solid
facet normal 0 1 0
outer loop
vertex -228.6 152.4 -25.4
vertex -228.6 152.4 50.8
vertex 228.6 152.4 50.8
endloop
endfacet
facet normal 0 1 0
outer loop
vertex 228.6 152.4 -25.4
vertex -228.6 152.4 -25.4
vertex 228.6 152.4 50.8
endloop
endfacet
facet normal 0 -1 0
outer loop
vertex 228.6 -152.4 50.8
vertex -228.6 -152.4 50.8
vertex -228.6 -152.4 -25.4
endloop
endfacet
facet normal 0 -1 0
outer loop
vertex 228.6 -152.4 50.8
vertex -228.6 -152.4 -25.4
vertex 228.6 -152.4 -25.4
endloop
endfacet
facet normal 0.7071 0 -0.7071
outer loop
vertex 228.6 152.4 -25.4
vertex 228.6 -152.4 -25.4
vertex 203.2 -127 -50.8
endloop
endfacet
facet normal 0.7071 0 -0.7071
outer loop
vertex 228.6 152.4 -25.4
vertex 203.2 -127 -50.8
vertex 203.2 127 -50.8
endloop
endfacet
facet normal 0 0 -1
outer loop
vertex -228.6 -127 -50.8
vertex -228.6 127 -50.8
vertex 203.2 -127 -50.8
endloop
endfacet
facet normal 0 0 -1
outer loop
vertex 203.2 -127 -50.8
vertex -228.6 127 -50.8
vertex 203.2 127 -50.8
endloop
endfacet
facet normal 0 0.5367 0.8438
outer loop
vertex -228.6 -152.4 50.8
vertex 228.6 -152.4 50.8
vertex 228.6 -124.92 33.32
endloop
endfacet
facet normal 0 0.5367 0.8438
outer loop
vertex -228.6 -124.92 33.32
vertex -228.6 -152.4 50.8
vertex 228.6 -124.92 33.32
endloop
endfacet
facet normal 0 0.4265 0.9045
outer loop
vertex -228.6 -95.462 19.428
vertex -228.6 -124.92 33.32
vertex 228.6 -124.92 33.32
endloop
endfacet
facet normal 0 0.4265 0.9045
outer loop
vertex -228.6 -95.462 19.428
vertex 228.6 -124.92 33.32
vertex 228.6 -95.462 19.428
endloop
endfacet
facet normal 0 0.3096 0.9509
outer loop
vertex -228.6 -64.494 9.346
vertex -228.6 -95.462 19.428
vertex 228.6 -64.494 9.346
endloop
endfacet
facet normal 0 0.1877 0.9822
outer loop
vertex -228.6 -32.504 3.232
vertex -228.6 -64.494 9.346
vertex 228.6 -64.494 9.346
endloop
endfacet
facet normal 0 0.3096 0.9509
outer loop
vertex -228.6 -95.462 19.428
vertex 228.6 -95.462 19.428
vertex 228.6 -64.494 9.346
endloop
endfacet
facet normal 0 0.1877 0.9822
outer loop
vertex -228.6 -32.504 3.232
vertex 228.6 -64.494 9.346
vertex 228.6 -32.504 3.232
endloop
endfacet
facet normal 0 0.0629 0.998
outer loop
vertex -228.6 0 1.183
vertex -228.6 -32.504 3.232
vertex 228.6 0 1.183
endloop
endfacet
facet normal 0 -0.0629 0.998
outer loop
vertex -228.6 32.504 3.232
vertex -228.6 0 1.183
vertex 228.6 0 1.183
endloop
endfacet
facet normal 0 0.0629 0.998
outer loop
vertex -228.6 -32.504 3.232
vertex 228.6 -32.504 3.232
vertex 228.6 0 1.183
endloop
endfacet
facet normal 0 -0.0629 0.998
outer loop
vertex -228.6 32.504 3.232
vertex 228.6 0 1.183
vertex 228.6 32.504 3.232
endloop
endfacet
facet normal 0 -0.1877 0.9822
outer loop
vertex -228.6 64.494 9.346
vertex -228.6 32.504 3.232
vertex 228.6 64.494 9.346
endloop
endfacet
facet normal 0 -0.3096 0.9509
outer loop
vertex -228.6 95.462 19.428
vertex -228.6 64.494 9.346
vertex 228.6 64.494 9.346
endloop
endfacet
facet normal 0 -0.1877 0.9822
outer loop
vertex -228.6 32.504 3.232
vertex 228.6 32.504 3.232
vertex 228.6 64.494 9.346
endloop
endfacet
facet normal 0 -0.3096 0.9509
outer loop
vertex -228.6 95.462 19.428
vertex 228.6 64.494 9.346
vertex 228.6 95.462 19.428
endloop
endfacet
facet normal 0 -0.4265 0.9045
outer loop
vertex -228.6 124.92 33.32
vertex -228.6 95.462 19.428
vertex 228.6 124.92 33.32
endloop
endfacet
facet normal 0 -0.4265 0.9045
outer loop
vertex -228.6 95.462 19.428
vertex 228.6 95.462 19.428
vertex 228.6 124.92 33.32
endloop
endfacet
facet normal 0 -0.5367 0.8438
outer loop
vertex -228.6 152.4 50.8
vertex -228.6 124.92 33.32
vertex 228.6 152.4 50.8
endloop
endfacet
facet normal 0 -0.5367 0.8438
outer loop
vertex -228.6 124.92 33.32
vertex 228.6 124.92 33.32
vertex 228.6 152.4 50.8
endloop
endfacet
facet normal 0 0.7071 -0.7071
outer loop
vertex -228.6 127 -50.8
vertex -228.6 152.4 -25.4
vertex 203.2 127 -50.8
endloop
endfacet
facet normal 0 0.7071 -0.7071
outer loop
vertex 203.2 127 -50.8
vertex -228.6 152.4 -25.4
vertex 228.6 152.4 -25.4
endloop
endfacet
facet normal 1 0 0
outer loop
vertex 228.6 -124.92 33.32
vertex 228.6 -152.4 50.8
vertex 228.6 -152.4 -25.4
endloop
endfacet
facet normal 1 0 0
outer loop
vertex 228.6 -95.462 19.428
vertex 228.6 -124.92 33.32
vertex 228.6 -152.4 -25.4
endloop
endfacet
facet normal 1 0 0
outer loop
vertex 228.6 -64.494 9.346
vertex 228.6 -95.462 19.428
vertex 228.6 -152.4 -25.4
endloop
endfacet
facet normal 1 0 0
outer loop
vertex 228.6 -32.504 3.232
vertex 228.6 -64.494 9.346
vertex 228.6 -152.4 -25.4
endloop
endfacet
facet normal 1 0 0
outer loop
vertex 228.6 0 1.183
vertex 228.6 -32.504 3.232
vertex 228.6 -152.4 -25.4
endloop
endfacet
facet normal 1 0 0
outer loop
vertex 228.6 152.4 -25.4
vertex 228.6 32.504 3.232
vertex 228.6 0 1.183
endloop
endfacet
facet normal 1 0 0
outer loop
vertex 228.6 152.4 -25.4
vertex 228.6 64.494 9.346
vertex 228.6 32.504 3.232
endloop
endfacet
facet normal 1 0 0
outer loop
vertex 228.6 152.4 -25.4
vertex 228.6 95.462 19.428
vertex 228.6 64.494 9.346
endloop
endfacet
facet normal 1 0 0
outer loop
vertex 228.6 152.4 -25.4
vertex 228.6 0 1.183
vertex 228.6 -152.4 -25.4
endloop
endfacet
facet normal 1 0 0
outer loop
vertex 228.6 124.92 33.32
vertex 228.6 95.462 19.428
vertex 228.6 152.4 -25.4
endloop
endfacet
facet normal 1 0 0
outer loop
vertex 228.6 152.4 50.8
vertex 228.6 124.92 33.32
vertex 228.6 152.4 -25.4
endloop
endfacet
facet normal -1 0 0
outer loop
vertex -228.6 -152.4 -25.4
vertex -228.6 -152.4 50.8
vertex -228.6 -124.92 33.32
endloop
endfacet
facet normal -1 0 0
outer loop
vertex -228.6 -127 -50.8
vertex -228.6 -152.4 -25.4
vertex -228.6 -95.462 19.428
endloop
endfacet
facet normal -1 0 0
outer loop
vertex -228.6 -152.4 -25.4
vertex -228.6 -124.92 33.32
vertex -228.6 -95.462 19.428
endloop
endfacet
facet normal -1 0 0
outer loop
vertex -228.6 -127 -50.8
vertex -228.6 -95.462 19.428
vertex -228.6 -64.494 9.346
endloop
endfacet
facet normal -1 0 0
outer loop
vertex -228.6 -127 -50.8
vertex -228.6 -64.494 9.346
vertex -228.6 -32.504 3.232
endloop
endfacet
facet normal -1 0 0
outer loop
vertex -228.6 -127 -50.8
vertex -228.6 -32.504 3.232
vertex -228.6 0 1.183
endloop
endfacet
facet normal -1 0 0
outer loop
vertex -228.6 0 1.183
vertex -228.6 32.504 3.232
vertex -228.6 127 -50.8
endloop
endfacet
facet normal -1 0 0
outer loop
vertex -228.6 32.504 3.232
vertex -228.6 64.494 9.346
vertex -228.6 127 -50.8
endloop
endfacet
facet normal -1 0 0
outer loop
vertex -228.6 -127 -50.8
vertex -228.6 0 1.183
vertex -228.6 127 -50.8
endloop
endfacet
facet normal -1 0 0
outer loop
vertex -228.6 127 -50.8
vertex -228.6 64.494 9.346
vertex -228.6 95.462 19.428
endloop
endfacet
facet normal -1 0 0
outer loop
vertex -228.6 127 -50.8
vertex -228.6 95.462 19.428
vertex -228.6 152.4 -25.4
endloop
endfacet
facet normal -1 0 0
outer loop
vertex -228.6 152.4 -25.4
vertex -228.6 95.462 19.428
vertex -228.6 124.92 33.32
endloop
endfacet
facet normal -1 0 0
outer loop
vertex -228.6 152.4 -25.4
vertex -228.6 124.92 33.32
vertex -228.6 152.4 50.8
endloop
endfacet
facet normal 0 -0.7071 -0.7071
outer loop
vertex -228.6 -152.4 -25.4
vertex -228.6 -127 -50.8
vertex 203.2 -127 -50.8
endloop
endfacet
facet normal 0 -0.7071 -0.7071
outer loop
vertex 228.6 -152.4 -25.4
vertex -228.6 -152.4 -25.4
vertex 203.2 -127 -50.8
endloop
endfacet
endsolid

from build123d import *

# Parameters (mm, degrees)
F0_W     = 457.2
F0_H     = 304.8
F1_DEPTH = 50.8
F2_R     = 258.858345
F3_DEPTH = 457.2
F4_SIZE  = 25.4
F5_SIZE  = 25.4


with BuildPart() as f1:
    # F0 (on Top) → F1 (new body, symmetric)
    with BuildSketch(Plane.XY):
        Rectangle(F0_W, F0_H)
    extrude(amount=F1_DEPTH, both=True)

    # F2 (on face) → F3 (cut, through all)
    with BuildSketch(Plane.YZ.offset(228.6)):
        with Locations((0, 260.041207)):
            Circle(F2_R)
    extrude(amount=-F3_DEPTH, mode=Mode.SUBTRACT)

    # F4
    f4_edges = [f1.edges().sort_by_distance(p)[0] for p in [
        (0, -152.4, -50.8),
    ]]
    chamfer(f4_edges, length=F4_SIZE)

    # F5
    f5_edges = [f1.edges().sort_by_distance(p)[0] for p in [
        (228.6, 12.7, -50.8),
        (0, 152.4, -50.8),
    ]]
    chamfer(f5_edges, length=F5_SIZE)


solid = f1.part
